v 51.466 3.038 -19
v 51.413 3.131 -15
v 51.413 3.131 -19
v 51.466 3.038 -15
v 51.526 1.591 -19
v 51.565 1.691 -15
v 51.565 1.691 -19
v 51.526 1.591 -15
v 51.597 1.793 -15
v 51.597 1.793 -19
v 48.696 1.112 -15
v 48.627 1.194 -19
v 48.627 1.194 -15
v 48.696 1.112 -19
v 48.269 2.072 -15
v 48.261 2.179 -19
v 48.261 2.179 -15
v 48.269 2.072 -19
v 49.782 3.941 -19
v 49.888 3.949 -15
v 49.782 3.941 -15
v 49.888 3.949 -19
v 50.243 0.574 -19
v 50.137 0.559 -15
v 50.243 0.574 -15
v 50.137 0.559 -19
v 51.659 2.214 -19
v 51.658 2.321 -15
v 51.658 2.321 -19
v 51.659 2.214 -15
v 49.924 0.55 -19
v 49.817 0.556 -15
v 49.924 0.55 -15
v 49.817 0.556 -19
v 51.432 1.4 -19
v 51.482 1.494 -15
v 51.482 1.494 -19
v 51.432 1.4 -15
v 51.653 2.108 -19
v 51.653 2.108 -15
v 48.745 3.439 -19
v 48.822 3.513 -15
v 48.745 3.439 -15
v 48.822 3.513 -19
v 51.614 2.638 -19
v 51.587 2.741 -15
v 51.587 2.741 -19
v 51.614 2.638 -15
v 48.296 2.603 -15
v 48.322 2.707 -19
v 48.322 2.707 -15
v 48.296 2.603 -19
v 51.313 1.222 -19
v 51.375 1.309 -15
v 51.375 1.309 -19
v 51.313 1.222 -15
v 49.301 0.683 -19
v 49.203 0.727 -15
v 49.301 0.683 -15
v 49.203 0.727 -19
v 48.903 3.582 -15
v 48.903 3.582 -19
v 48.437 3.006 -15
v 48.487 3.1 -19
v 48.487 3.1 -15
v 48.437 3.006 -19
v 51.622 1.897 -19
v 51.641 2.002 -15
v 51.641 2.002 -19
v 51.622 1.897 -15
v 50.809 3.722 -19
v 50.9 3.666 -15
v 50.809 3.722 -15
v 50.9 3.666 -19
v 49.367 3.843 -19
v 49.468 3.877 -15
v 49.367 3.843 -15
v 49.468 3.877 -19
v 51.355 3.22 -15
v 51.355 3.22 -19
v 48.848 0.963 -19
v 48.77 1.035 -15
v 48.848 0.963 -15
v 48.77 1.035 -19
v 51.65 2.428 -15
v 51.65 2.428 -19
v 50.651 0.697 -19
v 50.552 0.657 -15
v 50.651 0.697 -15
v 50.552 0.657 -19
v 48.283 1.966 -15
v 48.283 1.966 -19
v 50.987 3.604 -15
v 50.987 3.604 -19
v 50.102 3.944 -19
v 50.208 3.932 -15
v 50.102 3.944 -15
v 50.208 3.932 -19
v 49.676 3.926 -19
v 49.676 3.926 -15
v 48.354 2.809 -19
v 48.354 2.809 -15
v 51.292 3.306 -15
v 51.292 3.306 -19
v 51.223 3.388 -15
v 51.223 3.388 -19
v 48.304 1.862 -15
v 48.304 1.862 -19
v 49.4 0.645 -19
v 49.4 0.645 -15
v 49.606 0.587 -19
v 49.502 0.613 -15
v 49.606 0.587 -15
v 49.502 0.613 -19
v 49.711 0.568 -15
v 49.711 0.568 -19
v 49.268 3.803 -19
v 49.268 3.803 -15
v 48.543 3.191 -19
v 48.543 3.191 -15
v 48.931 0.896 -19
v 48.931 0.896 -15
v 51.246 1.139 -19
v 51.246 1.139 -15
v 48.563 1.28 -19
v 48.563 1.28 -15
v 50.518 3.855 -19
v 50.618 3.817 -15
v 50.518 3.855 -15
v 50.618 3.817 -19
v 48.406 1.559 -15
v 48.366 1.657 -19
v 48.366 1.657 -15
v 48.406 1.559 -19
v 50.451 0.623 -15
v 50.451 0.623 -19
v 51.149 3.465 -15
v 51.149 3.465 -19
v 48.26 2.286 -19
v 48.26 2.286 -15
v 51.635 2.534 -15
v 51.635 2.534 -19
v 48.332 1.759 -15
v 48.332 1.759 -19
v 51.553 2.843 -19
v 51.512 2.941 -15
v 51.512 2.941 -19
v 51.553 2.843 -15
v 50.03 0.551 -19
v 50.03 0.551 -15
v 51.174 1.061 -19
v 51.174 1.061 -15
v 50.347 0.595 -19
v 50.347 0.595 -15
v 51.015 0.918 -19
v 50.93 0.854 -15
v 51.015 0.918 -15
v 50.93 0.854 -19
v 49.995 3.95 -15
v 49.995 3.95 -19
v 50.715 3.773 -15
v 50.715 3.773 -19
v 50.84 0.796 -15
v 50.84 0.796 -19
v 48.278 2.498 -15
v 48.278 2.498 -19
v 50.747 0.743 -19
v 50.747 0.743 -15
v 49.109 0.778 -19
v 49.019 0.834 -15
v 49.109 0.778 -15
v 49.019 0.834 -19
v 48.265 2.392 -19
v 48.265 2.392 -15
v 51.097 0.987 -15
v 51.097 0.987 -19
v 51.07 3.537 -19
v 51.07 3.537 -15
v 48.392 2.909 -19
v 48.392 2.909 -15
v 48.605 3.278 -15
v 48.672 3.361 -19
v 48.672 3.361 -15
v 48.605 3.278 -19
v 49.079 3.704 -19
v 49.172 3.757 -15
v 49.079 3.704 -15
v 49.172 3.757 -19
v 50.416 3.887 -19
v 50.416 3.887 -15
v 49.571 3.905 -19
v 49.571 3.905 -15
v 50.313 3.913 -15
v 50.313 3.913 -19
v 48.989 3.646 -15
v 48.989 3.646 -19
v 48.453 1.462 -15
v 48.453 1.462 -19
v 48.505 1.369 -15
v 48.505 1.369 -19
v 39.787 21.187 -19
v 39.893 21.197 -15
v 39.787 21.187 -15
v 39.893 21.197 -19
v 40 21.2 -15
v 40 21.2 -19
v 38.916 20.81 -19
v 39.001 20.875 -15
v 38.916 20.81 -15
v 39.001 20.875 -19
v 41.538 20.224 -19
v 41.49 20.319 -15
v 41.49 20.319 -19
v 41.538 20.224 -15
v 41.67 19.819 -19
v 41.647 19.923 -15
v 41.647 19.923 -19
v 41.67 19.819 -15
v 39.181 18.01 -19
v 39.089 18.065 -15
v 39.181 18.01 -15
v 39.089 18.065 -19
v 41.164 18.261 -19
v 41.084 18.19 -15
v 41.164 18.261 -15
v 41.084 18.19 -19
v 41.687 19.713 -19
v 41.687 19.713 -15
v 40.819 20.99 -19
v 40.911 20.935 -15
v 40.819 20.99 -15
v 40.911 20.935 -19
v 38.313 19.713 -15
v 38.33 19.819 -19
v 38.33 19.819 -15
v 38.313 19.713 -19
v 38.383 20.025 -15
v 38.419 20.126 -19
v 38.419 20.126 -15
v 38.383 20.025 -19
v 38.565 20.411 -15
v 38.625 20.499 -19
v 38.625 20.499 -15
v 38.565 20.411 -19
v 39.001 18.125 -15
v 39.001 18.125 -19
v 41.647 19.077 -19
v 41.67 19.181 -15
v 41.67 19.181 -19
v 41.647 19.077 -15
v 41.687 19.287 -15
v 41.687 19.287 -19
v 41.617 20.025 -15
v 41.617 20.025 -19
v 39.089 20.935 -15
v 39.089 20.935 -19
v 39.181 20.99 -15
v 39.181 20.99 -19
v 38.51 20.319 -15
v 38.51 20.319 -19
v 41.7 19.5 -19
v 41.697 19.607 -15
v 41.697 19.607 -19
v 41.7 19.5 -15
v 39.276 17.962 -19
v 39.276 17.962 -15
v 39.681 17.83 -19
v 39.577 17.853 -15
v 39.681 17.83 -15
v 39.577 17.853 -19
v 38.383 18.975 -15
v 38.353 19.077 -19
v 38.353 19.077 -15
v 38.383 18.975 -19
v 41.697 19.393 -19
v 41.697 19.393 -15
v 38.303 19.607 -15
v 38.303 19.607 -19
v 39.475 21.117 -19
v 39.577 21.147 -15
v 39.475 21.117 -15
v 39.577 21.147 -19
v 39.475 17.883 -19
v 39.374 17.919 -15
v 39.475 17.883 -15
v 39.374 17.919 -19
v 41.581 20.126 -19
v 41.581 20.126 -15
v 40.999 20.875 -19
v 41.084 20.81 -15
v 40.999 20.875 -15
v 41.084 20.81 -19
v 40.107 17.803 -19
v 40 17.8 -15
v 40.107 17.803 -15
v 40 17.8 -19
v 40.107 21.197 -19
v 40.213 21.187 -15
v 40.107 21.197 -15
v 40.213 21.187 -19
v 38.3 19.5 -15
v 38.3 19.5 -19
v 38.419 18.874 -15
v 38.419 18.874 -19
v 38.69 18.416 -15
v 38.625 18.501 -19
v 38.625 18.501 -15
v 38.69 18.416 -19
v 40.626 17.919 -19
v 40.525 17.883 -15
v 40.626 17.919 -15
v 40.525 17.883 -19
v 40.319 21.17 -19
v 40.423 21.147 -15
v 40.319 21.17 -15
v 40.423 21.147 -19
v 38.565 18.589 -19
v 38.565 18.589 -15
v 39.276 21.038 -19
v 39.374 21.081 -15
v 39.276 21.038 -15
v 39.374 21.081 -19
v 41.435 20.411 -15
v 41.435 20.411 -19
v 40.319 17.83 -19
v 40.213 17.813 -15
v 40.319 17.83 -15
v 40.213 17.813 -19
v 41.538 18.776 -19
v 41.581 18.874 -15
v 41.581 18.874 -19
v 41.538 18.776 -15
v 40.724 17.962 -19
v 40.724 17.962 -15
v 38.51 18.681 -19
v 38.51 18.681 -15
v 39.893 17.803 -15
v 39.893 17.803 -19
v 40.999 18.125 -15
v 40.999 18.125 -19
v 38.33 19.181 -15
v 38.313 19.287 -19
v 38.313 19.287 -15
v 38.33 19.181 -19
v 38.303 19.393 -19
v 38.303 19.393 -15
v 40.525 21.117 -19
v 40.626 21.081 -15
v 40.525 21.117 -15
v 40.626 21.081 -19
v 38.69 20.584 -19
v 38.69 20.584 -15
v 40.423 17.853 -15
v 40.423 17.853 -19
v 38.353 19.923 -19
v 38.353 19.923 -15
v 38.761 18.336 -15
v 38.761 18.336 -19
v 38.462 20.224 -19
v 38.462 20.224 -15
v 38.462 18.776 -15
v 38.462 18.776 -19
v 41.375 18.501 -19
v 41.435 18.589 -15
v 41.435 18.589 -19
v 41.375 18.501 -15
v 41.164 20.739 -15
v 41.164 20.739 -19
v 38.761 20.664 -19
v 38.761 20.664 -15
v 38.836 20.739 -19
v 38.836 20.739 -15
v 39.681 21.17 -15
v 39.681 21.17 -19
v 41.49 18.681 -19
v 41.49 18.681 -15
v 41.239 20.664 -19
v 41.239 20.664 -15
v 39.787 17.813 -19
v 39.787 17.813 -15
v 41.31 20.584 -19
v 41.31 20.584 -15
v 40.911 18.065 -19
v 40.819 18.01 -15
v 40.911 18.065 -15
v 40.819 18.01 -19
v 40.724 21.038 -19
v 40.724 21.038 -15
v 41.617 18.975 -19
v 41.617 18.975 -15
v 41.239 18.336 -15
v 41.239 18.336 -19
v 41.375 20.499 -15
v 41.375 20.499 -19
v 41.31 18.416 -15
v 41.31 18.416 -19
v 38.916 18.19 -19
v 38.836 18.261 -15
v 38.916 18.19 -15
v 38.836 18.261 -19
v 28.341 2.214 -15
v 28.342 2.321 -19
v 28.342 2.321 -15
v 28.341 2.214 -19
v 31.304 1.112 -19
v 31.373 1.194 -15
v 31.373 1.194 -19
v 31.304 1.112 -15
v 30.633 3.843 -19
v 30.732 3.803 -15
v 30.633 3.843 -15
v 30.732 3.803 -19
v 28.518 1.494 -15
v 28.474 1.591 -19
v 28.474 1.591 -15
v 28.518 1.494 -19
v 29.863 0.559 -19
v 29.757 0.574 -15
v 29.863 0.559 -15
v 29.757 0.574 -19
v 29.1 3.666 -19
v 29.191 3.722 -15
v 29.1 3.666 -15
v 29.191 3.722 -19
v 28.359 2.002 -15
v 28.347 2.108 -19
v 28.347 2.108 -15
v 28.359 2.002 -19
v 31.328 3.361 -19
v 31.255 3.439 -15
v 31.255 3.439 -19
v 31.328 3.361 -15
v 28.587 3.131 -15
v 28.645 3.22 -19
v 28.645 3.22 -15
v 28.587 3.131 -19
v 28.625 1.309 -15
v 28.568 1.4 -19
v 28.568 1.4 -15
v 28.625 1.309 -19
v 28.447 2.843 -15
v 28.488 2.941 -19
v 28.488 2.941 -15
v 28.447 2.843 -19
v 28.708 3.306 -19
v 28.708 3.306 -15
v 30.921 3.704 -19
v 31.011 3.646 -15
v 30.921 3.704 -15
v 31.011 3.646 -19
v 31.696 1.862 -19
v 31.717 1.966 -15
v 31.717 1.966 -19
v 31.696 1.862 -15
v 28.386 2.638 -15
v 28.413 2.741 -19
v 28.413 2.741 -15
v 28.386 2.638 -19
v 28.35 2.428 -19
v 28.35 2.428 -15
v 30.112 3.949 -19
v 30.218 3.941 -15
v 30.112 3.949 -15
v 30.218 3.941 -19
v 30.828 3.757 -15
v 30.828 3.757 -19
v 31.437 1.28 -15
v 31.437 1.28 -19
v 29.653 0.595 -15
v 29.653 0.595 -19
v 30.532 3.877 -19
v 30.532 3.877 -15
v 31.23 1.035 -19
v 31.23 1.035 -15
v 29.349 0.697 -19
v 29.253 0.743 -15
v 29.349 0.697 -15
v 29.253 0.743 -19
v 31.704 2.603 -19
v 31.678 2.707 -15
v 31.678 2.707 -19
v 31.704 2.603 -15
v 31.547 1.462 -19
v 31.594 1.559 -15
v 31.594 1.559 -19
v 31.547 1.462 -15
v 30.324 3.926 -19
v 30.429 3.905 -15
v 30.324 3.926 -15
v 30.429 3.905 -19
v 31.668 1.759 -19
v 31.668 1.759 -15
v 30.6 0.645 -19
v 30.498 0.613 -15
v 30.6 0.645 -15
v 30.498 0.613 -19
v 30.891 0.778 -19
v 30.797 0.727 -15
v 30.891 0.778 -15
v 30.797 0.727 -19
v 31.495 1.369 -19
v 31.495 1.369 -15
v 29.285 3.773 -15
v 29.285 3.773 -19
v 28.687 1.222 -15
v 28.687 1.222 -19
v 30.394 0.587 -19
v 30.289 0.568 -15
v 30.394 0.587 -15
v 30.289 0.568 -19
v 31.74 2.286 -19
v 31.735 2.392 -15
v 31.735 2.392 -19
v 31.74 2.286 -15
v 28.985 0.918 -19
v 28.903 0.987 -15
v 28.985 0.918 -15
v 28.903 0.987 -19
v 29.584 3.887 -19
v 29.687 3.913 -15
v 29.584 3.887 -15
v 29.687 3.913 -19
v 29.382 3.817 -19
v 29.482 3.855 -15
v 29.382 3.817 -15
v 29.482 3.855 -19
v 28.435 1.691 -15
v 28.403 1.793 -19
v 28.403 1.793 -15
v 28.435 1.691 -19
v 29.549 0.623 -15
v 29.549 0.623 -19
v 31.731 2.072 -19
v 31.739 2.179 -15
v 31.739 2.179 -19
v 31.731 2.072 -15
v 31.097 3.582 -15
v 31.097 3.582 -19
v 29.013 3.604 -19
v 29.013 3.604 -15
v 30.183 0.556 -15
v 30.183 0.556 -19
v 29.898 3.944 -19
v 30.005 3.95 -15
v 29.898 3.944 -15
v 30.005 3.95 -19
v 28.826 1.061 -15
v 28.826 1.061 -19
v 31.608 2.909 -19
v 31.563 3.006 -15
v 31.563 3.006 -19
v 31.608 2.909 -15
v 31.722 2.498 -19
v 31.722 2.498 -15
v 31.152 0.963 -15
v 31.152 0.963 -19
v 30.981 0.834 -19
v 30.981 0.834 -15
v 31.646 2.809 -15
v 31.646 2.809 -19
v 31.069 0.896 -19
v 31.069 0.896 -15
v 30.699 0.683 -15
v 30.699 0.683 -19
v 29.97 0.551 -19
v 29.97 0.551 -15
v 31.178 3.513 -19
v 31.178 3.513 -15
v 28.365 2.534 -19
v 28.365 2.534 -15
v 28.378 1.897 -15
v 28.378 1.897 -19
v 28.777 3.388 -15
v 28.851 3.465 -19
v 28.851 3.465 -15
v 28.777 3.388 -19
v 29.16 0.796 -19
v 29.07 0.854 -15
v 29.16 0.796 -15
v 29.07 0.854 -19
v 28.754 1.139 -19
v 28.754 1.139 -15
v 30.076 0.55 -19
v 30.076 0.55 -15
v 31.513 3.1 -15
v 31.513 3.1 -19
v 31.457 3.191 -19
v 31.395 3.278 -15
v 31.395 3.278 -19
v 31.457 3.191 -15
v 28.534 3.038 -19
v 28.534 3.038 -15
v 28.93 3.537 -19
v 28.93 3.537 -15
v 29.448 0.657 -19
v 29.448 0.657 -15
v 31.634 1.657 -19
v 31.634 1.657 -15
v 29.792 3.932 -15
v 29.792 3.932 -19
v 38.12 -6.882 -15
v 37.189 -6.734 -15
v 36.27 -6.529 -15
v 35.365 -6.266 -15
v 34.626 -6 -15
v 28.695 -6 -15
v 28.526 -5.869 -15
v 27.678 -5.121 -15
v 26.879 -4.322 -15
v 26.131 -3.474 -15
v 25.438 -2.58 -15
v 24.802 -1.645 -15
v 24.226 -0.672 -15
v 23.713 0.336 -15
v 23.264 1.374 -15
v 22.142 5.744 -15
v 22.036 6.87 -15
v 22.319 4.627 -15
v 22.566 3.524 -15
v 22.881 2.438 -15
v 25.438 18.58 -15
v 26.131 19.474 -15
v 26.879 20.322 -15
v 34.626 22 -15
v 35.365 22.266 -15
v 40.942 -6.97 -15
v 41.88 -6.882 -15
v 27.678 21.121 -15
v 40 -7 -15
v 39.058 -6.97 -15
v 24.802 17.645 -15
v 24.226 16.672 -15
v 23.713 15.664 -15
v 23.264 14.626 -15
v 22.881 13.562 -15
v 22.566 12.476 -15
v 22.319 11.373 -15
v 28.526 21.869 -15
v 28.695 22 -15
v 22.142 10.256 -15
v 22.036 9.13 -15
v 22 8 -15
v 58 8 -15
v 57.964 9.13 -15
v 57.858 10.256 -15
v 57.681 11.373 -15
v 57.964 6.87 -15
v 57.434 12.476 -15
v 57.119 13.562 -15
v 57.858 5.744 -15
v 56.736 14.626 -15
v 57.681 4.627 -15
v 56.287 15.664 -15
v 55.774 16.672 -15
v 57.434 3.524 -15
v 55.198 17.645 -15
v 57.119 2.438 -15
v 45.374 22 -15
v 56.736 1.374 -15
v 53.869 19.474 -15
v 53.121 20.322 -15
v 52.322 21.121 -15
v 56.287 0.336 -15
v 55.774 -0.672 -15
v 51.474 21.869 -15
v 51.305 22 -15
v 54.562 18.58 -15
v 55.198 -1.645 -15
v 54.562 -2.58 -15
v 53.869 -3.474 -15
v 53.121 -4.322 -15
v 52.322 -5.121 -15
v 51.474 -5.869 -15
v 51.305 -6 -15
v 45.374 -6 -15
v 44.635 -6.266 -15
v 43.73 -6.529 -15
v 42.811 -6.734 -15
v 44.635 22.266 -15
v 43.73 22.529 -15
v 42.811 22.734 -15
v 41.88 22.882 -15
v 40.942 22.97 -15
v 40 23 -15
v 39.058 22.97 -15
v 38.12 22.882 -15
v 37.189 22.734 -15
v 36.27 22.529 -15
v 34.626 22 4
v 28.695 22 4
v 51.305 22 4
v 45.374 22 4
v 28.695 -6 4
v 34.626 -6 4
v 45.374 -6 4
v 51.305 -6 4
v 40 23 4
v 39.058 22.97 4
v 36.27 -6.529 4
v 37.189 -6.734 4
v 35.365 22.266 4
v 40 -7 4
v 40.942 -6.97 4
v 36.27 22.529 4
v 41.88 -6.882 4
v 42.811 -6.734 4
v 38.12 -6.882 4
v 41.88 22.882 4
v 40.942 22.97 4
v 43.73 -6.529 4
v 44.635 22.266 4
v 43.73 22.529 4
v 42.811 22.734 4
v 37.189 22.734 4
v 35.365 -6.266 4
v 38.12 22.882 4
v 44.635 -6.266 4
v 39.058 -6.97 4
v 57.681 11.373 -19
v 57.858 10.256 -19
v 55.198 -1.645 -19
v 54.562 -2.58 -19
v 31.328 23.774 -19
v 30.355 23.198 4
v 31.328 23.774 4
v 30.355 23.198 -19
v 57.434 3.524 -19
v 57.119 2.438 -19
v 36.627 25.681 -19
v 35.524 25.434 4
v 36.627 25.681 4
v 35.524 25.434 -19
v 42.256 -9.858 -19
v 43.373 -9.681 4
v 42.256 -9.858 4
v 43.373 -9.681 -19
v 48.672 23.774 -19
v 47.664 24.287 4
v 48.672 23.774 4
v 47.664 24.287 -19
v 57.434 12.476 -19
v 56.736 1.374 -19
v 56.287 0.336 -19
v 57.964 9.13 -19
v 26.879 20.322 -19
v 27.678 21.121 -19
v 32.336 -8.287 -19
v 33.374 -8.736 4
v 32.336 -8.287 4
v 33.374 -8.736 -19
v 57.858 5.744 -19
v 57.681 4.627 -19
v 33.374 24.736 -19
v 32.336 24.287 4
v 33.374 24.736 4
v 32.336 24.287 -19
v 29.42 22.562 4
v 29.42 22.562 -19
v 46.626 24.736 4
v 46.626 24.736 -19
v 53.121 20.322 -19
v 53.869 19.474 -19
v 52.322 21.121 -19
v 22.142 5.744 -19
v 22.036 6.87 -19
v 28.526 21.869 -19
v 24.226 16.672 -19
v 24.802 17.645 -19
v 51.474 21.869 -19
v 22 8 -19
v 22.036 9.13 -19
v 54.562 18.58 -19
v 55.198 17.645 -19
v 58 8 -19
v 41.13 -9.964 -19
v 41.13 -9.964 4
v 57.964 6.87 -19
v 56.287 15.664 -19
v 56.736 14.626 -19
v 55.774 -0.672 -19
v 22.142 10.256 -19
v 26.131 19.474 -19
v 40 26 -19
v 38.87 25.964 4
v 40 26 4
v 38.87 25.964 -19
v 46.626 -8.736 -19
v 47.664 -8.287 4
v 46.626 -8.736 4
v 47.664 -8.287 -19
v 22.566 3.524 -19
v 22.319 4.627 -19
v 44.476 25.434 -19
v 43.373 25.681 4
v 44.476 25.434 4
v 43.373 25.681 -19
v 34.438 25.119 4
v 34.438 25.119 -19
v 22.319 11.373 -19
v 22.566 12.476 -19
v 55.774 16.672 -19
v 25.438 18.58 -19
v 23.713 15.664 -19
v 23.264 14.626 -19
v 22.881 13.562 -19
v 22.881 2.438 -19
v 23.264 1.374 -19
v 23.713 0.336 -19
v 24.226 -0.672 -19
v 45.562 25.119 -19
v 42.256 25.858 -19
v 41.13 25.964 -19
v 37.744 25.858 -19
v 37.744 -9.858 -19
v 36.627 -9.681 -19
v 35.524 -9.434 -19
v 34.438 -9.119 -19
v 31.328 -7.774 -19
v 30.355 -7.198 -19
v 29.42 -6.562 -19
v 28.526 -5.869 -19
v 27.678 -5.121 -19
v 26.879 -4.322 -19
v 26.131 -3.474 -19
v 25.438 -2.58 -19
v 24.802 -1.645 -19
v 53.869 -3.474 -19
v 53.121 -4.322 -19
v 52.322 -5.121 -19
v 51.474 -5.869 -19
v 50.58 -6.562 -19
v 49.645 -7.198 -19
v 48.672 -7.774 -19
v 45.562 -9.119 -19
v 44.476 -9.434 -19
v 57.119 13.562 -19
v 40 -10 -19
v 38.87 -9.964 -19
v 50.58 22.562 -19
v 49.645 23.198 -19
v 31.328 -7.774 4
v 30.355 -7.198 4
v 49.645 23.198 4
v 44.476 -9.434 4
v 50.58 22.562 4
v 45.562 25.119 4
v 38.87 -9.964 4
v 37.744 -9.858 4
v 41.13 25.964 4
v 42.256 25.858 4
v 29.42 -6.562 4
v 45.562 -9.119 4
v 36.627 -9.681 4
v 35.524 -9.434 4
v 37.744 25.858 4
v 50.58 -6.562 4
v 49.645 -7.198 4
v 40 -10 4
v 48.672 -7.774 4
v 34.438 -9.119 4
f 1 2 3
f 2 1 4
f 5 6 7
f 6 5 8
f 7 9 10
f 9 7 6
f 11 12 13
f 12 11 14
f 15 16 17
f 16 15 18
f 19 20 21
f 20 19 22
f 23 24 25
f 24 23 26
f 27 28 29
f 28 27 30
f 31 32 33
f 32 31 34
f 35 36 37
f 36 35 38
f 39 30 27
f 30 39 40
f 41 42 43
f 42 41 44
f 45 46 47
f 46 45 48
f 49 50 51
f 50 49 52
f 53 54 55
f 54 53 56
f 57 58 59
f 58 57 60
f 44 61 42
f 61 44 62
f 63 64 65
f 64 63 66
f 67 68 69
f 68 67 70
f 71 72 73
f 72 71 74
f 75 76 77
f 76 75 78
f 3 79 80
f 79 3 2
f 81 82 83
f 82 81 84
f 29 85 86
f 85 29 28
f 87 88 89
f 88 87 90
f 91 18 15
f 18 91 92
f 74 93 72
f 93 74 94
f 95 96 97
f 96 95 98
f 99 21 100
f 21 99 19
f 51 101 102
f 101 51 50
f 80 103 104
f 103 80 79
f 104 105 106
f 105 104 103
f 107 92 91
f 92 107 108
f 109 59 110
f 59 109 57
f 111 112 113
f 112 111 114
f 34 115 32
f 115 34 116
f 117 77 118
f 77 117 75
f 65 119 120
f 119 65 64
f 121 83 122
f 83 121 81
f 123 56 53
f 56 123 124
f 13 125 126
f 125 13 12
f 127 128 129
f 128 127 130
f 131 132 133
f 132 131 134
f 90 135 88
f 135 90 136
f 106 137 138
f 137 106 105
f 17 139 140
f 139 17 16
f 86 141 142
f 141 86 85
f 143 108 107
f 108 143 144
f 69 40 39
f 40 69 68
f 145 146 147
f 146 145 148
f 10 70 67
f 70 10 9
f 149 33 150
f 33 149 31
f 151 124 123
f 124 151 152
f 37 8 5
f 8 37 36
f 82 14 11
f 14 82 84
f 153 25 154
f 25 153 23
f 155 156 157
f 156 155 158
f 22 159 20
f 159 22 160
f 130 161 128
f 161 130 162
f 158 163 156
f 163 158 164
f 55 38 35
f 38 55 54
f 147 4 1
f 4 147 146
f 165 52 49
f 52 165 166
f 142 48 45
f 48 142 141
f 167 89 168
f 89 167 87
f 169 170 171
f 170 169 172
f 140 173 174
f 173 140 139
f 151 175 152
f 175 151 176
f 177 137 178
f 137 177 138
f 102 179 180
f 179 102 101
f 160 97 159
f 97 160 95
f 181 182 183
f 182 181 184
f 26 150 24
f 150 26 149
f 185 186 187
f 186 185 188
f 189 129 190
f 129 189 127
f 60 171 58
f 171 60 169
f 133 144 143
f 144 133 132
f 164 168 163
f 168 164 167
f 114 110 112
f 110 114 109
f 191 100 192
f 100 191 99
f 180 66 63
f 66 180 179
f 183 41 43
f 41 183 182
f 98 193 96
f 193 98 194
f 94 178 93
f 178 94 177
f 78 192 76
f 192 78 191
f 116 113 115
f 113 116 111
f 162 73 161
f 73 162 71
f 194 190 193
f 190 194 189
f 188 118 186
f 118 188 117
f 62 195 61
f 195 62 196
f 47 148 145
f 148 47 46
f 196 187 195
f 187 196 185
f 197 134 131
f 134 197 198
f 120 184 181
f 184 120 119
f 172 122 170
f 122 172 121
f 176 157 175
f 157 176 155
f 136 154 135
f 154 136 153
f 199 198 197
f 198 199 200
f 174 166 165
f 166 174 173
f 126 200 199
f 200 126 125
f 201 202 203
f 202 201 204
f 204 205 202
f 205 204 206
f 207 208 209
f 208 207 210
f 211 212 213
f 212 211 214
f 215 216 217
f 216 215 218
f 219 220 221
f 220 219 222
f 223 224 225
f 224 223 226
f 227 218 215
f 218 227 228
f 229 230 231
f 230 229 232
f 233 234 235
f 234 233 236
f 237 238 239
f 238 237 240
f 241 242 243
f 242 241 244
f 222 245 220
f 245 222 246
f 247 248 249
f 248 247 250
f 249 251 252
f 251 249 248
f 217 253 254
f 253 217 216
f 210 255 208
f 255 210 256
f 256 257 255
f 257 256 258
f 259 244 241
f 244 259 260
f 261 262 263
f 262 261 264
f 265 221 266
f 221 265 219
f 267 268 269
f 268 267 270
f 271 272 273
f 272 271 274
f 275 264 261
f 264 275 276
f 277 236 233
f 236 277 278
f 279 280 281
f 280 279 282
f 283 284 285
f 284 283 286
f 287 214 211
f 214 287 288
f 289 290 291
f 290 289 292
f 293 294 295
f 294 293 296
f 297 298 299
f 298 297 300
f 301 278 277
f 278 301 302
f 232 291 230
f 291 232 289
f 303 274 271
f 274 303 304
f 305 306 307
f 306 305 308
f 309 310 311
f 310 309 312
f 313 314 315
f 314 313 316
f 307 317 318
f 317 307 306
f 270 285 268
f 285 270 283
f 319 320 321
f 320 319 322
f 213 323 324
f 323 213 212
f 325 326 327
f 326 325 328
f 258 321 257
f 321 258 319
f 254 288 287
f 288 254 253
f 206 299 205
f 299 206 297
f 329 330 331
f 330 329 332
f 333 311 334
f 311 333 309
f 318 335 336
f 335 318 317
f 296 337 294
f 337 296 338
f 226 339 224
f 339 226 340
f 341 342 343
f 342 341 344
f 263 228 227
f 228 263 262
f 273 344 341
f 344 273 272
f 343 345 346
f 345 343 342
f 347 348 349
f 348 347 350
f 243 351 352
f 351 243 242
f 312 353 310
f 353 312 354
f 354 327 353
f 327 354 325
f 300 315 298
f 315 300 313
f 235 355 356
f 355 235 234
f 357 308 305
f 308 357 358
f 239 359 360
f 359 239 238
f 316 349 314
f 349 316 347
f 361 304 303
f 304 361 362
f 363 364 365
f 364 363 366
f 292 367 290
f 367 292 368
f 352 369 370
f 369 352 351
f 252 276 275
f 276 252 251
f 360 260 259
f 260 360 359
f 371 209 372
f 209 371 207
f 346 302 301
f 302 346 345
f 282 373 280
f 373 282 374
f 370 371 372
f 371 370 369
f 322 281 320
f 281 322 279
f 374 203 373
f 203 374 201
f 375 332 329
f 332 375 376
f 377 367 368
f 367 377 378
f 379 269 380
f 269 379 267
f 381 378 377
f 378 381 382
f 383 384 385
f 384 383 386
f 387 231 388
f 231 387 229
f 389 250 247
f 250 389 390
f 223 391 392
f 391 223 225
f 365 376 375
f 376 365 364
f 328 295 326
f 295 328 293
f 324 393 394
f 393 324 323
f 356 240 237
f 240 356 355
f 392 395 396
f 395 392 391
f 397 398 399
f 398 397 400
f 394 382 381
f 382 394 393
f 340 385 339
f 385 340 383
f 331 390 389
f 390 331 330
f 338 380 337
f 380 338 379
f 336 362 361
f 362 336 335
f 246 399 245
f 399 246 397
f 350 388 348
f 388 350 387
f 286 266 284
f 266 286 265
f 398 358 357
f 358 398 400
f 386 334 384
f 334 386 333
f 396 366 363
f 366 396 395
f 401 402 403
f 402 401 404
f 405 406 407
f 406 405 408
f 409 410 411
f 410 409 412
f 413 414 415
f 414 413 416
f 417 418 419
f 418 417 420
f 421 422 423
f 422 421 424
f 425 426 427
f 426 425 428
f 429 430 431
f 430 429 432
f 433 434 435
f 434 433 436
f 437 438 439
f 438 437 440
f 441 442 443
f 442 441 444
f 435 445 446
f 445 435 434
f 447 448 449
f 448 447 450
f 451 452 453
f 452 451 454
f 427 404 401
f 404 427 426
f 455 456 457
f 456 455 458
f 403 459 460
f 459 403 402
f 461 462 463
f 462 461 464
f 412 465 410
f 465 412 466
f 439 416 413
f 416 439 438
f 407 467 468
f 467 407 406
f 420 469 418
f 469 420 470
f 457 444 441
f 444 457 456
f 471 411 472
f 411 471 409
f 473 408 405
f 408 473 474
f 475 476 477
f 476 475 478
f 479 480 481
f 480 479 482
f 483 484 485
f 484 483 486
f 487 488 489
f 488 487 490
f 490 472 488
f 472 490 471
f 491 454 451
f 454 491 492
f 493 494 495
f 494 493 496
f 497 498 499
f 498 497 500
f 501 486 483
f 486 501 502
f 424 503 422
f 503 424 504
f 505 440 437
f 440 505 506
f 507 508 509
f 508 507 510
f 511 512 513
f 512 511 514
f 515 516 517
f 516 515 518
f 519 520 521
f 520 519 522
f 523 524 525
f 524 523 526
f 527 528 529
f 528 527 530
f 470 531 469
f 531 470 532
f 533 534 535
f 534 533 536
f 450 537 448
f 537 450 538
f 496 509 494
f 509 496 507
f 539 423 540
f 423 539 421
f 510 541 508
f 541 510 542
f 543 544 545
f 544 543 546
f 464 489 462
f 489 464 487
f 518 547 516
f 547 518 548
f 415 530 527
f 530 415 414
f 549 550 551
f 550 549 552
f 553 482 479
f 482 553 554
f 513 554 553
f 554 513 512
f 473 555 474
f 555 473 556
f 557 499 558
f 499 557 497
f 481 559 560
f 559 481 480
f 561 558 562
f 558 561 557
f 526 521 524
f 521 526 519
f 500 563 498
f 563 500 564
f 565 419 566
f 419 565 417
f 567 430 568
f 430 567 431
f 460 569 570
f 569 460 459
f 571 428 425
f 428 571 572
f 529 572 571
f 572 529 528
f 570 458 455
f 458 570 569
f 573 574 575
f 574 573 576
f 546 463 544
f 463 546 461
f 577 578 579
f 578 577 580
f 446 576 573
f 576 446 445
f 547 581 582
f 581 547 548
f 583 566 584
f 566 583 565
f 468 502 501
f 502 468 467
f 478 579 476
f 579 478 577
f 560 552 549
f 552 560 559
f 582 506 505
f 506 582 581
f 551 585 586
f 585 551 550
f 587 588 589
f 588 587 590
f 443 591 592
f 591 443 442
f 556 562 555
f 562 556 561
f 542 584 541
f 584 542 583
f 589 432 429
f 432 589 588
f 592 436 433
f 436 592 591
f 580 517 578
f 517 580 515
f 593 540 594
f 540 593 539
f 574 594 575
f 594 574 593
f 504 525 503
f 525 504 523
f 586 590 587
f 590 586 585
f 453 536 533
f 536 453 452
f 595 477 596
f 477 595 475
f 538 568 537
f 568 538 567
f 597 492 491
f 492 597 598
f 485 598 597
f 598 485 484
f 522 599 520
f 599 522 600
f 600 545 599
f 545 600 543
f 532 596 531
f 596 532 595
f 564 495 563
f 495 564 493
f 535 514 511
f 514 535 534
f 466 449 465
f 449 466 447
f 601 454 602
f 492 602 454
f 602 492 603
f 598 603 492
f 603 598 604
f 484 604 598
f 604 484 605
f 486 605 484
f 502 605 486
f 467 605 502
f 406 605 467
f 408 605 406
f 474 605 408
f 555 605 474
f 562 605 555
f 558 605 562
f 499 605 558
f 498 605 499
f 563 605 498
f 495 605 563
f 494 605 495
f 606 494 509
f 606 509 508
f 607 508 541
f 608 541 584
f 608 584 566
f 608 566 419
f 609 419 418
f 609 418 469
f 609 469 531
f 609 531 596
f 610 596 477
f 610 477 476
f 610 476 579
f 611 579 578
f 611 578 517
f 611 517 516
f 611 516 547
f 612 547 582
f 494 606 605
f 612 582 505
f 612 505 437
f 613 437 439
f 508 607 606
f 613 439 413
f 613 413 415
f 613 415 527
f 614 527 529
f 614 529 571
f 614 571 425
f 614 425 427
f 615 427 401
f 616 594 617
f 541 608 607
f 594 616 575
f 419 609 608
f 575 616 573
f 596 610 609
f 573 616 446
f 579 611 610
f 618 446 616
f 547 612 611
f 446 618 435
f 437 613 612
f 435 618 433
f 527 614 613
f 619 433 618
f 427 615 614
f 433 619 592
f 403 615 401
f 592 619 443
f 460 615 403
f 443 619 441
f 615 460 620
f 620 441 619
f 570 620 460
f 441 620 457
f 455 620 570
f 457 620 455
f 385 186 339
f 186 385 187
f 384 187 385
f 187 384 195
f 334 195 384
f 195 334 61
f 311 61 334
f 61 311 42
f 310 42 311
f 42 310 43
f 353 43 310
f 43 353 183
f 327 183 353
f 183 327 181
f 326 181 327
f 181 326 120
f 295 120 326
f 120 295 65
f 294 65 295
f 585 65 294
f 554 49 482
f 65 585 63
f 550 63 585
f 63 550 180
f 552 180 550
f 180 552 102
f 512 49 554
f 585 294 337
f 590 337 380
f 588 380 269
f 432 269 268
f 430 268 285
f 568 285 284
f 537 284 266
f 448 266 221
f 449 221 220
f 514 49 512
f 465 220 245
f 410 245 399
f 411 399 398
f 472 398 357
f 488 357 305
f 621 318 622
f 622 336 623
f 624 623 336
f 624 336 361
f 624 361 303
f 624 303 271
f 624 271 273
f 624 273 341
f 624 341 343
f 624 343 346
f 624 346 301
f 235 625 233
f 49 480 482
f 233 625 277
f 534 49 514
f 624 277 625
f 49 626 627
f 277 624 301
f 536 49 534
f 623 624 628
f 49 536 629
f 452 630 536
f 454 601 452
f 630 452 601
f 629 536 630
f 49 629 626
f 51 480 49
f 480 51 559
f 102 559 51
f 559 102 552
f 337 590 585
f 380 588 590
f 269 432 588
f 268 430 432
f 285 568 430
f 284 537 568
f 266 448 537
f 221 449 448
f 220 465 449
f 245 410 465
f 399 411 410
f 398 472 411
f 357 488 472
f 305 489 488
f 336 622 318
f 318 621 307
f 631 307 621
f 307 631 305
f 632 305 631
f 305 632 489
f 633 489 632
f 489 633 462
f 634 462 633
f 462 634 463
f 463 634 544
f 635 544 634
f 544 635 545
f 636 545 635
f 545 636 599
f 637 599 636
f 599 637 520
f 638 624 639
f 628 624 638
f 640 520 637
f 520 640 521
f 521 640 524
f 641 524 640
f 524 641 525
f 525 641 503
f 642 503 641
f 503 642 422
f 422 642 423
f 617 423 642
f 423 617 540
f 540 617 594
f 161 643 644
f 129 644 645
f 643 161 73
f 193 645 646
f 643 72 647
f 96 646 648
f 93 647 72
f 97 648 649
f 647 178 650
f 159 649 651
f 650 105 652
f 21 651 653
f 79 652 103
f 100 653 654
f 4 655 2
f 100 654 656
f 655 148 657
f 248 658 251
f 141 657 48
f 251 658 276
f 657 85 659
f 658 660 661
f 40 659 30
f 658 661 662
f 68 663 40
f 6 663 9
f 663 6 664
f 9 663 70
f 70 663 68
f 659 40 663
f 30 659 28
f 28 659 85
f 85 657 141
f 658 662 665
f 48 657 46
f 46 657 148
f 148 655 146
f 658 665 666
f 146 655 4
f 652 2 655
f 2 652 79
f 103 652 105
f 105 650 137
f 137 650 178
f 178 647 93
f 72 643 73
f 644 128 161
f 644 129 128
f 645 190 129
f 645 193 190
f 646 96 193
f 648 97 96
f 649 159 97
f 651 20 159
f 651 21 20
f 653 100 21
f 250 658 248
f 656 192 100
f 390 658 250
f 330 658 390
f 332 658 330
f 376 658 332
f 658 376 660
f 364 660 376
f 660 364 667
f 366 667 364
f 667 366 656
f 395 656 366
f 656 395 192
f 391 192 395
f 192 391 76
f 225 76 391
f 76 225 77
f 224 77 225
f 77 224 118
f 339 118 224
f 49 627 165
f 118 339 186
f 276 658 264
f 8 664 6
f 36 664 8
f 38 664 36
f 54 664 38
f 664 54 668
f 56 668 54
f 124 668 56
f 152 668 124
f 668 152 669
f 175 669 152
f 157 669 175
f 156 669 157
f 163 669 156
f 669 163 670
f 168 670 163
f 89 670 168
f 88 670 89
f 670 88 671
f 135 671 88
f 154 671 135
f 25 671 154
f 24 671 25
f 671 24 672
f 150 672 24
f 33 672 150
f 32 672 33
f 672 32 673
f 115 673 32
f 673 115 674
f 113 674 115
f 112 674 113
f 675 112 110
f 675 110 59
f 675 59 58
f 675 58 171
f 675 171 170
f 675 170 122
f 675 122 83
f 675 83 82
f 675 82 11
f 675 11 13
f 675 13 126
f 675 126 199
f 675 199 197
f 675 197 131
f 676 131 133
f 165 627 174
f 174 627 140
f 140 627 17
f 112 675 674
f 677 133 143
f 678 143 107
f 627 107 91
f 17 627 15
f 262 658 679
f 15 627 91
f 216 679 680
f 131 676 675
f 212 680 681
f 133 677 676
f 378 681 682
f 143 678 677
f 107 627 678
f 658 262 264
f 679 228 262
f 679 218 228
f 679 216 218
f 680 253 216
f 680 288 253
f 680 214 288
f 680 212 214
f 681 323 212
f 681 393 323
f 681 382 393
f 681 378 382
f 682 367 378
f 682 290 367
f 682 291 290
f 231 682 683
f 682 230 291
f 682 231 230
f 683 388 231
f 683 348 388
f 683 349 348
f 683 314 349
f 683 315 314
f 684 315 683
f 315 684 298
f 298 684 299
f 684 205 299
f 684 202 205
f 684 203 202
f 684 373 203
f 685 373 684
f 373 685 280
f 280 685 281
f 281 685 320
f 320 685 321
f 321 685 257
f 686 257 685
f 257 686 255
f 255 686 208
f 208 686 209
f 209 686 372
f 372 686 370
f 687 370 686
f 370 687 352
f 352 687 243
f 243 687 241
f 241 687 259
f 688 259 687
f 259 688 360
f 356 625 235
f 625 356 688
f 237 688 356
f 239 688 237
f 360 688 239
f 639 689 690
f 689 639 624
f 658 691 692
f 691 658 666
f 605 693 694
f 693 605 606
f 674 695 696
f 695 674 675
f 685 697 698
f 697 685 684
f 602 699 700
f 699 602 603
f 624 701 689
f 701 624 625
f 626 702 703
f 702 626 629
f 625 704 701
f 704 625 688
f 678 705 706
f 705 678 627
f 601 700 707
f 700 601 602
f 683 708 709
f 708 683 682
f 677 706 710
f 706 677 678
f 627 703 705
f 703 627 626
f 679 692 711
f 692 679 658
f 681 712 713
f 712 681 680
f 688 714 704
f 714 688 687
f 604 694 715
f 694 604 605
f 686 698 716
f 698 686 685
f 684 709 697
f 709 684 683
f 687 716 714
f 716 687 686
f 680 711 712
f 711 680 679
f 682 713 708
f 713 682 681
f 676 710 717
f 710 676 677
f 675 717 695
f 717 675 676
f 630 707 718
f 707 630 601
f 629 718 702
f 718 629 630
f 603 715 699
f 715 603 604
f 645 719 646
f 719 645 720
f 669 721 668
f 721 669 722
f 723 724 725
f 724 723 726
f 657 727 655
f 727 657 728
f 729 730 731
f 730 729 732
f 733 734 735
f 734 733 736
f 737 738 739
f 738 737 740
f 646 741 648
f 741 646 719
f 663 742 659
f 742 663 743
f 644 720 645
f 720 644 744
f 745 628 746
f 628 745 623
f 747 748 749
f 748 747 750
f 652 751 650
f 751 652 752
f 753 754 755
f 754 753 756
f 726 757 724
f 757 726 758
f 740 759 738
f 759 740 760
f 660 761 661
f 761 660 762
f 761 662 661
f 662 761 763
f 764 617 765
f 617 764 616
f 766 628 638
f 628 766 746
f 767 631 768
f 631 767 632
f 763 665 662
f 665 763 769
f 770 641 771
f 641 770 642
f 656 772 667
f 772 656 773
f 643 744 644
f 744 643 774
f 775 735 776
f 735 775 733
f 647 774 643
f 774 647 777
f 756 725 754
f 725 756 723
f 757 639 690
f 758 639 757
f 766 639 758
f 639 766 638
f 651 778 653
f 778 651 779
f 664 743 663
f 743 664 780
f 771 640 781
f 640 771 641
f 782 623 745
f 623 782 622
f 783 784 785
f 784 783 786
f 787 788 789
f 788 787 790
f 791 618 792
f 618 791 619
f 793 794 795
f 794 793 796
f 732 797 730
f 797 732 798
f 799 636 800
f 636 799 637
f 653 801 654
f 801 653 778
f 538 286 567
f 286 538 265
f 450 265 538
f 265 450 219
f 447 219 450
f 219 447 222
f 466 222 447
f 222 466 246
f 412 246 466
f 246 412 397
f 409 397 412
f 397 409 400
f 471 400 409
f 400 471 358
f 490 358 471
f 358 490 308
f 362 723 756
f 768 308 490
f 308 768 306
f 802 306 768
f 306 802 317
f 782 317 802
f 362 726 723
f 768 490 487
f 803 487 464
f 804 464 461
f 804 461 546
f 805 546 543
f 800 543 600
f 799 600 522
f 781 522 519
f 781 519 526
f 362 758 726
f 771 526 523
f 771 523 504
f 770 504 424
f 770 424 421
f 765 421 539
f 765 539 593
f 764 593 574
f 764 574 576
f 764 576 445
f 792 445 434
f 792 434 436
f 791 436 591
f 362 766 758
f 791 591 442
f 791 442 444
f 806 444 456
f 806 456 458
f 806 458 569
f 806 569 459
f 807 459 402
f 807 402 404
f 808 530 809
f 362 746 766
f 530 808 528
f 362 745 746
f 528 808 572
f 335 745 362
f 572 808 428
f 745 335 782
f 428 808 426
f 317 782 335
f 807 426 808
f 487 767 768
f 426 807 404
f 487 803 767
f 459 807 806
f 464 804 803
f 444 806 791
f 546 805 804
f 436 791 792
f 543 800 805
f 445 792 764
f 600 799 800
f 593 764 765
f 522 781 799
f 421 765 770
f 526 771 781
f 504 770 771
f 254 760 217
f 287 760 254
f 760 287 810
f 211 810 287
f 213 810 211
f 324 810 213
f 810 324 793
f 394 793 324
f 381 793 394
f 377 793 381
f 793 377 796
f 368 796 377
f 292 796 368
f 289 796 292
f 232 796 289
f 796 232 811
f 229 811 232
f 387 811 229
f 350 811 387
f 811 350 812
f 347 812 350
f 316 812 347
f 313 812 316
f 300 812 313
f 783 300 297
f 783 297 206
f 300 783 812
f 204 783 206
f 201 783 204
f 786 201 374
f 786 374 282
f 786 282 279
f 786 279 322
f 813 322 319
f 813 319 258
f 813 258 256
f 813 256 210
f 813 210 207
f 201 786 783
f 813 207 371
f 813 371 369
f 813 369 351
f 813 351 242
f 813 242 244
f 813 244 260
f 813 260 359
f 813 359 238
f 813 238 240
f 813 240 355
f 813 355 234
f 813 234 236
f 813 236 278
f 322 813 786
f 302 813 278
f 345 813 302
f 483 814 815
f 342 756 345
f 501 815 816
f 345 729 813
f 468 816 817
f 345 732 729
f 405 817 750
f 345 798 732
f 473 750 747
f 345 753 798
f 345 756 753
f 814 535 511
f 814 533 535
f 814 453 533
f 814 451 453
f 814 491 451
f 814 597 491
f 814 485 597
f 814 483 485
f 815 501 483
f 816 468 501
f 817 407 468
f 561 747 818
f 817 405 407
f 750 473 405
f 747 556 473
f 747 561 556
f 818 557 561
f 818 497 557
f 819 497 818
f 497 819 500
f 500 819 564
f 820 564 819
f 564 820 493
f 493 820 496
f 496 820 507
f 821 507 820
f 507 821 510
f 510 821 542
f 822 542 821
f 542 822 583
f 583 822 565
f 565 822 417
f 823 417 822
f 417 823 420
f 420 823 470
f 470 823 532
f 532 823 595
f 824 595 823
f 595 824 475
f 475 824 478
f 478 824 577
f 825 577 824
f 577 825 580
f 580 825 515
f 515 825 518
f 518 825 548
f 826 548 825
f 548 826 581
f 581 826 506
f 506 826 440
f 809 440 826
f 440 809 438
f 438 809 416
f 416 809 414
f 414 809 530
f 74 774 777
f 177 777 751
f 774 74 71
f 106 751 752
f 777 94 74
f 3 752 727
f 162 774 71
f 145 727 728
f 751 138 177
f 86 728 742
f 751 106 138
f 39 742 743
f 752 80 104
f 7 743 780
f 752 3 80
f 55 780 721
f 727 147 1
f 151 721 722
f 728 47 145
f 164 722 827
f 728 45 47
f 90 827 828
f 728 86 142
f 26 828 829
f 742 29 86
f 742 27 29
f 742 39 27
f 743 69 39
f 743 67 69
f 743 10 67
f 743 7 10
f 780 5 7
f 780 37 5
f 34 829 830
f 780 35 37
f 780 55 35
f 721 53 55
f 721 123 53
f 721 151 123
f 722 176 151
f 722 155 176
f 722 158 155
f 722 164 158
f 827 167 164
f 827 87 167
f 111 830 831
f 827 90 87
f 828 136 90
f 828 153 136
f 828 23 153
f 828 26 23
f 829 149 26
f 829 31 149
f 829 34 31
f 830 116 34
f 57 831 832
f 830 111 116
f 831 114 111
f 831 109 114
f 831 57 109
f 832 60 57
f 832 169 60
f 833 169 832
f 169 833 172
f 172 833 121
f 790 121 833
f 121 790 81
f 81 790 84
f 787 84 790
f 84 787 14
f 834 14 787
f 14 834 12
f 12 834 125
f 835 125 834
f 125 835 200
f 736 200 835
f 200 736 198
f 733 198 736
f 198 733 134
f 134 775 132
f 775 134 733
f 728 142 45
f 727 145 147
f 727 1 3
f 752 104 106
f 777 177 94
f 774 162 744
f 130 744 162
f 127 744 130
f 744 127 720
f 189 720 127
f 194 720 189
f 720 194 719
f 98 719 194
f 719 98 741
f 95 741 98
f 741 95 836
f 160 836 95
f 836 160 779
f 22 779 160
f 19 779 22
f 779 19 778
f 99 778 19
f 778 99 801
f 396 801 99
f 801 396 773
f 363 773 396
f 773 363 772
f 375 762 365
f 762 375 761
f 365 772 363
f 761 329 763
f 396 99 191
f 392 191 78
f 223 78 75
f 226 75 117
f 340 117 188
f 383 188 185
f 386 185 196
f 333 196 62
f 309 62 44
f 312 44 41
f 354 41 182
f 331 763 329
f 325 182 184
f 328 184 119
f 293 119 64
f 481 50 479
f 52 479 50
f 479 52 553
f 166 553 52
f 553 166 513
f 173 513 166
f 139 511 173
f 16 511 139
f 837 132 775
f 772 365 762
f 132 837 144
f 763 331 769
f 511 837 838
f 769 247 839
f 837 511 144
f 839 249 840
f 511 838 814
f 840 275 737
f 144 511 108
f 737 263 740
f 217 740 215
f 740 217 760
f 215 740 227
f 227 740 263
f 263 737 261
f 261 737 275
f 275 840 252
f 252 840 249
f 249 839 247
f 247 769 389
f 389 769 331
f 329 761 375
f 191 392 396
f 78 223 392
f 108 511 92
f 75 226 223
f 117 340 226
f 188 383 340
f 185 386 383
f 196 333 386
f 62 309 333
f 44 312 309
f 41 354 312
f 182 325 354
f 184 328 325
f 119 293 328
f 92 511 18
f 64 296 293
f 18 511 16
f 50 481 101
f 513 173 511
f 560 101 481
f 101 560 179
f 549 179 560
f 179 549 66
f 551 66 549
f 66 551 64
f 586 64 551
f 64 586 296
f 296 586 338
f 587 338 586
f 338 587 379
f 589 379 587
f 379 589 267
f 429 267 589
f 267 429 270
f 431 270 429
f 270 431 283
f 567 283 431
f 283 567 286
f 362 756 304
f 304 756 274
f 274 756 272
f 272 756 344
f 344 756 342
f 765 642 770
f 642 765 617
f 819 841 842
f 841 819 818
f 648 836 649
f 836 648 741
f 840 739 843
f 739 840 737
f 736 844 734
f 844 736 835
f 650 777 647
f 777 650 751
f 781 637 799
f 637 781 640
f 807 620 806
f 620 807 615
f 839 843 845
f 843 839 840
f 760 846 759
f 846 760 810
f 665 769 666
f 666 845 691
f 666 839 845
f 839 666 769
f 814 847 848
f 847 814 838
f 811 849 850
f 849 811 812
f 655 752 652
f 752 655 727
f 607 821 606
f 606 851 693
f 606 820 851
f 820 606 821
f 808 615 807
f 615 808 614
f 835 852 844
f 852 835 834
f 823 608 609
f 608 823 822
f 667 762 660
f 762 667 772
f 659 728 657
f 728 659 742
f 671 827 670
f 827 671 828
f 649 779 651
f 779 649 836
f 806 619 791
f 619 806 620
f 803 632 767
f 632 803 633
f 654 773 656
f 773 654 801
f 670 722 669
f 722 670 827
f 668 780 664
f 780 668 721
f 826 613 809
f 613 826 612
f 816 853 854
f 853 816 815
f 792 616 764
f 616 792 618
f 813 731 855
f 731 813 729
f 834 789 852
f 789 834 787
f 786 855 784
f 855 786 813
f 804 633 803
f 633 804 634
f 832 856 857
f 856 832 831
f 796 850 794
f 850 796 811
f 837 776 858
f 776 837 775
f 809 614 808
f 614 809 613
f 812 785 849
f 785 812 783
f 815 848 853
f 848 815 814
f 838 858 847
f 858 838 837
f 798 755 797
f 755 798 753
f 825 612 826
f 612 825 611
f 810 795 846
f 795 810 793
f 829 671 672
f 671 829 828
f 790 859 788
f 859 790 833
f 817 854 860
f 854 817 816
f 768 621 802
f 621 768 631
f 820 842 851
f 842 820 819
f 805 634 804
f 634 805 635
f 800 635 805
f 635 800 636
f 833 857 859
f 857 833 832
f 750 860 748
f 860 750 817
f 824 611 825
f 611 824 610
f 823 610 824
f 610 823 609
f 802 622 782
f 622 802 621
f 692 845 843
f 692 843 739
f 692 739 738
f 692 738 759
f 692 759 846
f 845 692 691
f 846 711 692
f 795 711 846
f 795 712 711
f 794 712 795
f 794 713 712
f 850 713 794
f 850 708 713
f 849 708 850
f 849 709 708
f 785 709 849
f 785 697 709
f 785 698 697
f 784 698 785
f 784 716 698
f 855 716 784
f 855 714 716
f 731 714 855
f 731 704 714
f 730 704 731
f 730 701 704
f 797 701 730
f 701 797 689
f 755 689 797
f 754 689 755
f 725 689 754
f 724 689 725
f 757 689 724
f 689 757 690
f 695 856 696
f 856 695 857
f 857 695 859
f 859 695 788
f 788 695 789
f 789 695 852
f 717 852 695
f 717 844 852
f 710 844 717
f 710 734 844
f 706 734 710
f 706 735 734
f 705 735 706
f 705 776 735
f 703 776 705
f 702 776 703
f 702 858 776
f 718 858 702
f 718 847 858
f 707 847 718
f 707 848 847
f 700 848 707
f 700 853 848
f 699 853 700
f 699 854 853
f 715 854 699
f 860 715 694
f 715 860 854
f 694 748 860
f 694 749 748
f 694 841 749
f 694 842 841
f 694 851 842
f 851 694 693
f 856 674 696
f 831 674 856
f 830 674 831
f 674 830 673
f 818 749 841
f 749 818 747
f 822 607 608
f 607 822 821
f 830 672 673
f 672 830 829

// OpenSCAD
difference(){
	union(){



     


        translate([-7.5+54-32,-17+11.5,-4-15]){
            translate([51/2,27/2,0]){
                rotate([0,0,0]){
                    cylinder(h=4+15+4, r=18.0, $fn=100, center=false);
                }
            }  

        }     

    


	}
	union() {

        translate([0,-6,-15]){
            cube([100,28,39], center=false);
        }         

        translate([-7.5+54-32,-17+11.5,-15]){
            translate([51/2,27/2,0]){
                rotate([0,0,0]){
                    cylinder(h=40, r=15.0, $fn=100, center=false);
                }
            }  

        }   
  



        translate([-7.5+54-32,-17+11.5,-50]){

            translate([51/2,27/2,-1]){
                rotate([0,0,0-30]){
                    translate([11.5,0,0]){
                        cylinder(h=500, r=1.7, $fn=100, center=false);
                    }
                }
                rotate([0,0,120-30]){
                    translate([11.5,0,0]){
                        cylinder(h=500, r=1.7, $fn=100, center=false);
                    }
                }
                rotate([0,0,240-30]){
                    translate([11.5,0,0]){
                        cylinder(h=500, r=1.7, $fn=100, center=false);
                    }
                }
            }
    }     

      
	}
}
